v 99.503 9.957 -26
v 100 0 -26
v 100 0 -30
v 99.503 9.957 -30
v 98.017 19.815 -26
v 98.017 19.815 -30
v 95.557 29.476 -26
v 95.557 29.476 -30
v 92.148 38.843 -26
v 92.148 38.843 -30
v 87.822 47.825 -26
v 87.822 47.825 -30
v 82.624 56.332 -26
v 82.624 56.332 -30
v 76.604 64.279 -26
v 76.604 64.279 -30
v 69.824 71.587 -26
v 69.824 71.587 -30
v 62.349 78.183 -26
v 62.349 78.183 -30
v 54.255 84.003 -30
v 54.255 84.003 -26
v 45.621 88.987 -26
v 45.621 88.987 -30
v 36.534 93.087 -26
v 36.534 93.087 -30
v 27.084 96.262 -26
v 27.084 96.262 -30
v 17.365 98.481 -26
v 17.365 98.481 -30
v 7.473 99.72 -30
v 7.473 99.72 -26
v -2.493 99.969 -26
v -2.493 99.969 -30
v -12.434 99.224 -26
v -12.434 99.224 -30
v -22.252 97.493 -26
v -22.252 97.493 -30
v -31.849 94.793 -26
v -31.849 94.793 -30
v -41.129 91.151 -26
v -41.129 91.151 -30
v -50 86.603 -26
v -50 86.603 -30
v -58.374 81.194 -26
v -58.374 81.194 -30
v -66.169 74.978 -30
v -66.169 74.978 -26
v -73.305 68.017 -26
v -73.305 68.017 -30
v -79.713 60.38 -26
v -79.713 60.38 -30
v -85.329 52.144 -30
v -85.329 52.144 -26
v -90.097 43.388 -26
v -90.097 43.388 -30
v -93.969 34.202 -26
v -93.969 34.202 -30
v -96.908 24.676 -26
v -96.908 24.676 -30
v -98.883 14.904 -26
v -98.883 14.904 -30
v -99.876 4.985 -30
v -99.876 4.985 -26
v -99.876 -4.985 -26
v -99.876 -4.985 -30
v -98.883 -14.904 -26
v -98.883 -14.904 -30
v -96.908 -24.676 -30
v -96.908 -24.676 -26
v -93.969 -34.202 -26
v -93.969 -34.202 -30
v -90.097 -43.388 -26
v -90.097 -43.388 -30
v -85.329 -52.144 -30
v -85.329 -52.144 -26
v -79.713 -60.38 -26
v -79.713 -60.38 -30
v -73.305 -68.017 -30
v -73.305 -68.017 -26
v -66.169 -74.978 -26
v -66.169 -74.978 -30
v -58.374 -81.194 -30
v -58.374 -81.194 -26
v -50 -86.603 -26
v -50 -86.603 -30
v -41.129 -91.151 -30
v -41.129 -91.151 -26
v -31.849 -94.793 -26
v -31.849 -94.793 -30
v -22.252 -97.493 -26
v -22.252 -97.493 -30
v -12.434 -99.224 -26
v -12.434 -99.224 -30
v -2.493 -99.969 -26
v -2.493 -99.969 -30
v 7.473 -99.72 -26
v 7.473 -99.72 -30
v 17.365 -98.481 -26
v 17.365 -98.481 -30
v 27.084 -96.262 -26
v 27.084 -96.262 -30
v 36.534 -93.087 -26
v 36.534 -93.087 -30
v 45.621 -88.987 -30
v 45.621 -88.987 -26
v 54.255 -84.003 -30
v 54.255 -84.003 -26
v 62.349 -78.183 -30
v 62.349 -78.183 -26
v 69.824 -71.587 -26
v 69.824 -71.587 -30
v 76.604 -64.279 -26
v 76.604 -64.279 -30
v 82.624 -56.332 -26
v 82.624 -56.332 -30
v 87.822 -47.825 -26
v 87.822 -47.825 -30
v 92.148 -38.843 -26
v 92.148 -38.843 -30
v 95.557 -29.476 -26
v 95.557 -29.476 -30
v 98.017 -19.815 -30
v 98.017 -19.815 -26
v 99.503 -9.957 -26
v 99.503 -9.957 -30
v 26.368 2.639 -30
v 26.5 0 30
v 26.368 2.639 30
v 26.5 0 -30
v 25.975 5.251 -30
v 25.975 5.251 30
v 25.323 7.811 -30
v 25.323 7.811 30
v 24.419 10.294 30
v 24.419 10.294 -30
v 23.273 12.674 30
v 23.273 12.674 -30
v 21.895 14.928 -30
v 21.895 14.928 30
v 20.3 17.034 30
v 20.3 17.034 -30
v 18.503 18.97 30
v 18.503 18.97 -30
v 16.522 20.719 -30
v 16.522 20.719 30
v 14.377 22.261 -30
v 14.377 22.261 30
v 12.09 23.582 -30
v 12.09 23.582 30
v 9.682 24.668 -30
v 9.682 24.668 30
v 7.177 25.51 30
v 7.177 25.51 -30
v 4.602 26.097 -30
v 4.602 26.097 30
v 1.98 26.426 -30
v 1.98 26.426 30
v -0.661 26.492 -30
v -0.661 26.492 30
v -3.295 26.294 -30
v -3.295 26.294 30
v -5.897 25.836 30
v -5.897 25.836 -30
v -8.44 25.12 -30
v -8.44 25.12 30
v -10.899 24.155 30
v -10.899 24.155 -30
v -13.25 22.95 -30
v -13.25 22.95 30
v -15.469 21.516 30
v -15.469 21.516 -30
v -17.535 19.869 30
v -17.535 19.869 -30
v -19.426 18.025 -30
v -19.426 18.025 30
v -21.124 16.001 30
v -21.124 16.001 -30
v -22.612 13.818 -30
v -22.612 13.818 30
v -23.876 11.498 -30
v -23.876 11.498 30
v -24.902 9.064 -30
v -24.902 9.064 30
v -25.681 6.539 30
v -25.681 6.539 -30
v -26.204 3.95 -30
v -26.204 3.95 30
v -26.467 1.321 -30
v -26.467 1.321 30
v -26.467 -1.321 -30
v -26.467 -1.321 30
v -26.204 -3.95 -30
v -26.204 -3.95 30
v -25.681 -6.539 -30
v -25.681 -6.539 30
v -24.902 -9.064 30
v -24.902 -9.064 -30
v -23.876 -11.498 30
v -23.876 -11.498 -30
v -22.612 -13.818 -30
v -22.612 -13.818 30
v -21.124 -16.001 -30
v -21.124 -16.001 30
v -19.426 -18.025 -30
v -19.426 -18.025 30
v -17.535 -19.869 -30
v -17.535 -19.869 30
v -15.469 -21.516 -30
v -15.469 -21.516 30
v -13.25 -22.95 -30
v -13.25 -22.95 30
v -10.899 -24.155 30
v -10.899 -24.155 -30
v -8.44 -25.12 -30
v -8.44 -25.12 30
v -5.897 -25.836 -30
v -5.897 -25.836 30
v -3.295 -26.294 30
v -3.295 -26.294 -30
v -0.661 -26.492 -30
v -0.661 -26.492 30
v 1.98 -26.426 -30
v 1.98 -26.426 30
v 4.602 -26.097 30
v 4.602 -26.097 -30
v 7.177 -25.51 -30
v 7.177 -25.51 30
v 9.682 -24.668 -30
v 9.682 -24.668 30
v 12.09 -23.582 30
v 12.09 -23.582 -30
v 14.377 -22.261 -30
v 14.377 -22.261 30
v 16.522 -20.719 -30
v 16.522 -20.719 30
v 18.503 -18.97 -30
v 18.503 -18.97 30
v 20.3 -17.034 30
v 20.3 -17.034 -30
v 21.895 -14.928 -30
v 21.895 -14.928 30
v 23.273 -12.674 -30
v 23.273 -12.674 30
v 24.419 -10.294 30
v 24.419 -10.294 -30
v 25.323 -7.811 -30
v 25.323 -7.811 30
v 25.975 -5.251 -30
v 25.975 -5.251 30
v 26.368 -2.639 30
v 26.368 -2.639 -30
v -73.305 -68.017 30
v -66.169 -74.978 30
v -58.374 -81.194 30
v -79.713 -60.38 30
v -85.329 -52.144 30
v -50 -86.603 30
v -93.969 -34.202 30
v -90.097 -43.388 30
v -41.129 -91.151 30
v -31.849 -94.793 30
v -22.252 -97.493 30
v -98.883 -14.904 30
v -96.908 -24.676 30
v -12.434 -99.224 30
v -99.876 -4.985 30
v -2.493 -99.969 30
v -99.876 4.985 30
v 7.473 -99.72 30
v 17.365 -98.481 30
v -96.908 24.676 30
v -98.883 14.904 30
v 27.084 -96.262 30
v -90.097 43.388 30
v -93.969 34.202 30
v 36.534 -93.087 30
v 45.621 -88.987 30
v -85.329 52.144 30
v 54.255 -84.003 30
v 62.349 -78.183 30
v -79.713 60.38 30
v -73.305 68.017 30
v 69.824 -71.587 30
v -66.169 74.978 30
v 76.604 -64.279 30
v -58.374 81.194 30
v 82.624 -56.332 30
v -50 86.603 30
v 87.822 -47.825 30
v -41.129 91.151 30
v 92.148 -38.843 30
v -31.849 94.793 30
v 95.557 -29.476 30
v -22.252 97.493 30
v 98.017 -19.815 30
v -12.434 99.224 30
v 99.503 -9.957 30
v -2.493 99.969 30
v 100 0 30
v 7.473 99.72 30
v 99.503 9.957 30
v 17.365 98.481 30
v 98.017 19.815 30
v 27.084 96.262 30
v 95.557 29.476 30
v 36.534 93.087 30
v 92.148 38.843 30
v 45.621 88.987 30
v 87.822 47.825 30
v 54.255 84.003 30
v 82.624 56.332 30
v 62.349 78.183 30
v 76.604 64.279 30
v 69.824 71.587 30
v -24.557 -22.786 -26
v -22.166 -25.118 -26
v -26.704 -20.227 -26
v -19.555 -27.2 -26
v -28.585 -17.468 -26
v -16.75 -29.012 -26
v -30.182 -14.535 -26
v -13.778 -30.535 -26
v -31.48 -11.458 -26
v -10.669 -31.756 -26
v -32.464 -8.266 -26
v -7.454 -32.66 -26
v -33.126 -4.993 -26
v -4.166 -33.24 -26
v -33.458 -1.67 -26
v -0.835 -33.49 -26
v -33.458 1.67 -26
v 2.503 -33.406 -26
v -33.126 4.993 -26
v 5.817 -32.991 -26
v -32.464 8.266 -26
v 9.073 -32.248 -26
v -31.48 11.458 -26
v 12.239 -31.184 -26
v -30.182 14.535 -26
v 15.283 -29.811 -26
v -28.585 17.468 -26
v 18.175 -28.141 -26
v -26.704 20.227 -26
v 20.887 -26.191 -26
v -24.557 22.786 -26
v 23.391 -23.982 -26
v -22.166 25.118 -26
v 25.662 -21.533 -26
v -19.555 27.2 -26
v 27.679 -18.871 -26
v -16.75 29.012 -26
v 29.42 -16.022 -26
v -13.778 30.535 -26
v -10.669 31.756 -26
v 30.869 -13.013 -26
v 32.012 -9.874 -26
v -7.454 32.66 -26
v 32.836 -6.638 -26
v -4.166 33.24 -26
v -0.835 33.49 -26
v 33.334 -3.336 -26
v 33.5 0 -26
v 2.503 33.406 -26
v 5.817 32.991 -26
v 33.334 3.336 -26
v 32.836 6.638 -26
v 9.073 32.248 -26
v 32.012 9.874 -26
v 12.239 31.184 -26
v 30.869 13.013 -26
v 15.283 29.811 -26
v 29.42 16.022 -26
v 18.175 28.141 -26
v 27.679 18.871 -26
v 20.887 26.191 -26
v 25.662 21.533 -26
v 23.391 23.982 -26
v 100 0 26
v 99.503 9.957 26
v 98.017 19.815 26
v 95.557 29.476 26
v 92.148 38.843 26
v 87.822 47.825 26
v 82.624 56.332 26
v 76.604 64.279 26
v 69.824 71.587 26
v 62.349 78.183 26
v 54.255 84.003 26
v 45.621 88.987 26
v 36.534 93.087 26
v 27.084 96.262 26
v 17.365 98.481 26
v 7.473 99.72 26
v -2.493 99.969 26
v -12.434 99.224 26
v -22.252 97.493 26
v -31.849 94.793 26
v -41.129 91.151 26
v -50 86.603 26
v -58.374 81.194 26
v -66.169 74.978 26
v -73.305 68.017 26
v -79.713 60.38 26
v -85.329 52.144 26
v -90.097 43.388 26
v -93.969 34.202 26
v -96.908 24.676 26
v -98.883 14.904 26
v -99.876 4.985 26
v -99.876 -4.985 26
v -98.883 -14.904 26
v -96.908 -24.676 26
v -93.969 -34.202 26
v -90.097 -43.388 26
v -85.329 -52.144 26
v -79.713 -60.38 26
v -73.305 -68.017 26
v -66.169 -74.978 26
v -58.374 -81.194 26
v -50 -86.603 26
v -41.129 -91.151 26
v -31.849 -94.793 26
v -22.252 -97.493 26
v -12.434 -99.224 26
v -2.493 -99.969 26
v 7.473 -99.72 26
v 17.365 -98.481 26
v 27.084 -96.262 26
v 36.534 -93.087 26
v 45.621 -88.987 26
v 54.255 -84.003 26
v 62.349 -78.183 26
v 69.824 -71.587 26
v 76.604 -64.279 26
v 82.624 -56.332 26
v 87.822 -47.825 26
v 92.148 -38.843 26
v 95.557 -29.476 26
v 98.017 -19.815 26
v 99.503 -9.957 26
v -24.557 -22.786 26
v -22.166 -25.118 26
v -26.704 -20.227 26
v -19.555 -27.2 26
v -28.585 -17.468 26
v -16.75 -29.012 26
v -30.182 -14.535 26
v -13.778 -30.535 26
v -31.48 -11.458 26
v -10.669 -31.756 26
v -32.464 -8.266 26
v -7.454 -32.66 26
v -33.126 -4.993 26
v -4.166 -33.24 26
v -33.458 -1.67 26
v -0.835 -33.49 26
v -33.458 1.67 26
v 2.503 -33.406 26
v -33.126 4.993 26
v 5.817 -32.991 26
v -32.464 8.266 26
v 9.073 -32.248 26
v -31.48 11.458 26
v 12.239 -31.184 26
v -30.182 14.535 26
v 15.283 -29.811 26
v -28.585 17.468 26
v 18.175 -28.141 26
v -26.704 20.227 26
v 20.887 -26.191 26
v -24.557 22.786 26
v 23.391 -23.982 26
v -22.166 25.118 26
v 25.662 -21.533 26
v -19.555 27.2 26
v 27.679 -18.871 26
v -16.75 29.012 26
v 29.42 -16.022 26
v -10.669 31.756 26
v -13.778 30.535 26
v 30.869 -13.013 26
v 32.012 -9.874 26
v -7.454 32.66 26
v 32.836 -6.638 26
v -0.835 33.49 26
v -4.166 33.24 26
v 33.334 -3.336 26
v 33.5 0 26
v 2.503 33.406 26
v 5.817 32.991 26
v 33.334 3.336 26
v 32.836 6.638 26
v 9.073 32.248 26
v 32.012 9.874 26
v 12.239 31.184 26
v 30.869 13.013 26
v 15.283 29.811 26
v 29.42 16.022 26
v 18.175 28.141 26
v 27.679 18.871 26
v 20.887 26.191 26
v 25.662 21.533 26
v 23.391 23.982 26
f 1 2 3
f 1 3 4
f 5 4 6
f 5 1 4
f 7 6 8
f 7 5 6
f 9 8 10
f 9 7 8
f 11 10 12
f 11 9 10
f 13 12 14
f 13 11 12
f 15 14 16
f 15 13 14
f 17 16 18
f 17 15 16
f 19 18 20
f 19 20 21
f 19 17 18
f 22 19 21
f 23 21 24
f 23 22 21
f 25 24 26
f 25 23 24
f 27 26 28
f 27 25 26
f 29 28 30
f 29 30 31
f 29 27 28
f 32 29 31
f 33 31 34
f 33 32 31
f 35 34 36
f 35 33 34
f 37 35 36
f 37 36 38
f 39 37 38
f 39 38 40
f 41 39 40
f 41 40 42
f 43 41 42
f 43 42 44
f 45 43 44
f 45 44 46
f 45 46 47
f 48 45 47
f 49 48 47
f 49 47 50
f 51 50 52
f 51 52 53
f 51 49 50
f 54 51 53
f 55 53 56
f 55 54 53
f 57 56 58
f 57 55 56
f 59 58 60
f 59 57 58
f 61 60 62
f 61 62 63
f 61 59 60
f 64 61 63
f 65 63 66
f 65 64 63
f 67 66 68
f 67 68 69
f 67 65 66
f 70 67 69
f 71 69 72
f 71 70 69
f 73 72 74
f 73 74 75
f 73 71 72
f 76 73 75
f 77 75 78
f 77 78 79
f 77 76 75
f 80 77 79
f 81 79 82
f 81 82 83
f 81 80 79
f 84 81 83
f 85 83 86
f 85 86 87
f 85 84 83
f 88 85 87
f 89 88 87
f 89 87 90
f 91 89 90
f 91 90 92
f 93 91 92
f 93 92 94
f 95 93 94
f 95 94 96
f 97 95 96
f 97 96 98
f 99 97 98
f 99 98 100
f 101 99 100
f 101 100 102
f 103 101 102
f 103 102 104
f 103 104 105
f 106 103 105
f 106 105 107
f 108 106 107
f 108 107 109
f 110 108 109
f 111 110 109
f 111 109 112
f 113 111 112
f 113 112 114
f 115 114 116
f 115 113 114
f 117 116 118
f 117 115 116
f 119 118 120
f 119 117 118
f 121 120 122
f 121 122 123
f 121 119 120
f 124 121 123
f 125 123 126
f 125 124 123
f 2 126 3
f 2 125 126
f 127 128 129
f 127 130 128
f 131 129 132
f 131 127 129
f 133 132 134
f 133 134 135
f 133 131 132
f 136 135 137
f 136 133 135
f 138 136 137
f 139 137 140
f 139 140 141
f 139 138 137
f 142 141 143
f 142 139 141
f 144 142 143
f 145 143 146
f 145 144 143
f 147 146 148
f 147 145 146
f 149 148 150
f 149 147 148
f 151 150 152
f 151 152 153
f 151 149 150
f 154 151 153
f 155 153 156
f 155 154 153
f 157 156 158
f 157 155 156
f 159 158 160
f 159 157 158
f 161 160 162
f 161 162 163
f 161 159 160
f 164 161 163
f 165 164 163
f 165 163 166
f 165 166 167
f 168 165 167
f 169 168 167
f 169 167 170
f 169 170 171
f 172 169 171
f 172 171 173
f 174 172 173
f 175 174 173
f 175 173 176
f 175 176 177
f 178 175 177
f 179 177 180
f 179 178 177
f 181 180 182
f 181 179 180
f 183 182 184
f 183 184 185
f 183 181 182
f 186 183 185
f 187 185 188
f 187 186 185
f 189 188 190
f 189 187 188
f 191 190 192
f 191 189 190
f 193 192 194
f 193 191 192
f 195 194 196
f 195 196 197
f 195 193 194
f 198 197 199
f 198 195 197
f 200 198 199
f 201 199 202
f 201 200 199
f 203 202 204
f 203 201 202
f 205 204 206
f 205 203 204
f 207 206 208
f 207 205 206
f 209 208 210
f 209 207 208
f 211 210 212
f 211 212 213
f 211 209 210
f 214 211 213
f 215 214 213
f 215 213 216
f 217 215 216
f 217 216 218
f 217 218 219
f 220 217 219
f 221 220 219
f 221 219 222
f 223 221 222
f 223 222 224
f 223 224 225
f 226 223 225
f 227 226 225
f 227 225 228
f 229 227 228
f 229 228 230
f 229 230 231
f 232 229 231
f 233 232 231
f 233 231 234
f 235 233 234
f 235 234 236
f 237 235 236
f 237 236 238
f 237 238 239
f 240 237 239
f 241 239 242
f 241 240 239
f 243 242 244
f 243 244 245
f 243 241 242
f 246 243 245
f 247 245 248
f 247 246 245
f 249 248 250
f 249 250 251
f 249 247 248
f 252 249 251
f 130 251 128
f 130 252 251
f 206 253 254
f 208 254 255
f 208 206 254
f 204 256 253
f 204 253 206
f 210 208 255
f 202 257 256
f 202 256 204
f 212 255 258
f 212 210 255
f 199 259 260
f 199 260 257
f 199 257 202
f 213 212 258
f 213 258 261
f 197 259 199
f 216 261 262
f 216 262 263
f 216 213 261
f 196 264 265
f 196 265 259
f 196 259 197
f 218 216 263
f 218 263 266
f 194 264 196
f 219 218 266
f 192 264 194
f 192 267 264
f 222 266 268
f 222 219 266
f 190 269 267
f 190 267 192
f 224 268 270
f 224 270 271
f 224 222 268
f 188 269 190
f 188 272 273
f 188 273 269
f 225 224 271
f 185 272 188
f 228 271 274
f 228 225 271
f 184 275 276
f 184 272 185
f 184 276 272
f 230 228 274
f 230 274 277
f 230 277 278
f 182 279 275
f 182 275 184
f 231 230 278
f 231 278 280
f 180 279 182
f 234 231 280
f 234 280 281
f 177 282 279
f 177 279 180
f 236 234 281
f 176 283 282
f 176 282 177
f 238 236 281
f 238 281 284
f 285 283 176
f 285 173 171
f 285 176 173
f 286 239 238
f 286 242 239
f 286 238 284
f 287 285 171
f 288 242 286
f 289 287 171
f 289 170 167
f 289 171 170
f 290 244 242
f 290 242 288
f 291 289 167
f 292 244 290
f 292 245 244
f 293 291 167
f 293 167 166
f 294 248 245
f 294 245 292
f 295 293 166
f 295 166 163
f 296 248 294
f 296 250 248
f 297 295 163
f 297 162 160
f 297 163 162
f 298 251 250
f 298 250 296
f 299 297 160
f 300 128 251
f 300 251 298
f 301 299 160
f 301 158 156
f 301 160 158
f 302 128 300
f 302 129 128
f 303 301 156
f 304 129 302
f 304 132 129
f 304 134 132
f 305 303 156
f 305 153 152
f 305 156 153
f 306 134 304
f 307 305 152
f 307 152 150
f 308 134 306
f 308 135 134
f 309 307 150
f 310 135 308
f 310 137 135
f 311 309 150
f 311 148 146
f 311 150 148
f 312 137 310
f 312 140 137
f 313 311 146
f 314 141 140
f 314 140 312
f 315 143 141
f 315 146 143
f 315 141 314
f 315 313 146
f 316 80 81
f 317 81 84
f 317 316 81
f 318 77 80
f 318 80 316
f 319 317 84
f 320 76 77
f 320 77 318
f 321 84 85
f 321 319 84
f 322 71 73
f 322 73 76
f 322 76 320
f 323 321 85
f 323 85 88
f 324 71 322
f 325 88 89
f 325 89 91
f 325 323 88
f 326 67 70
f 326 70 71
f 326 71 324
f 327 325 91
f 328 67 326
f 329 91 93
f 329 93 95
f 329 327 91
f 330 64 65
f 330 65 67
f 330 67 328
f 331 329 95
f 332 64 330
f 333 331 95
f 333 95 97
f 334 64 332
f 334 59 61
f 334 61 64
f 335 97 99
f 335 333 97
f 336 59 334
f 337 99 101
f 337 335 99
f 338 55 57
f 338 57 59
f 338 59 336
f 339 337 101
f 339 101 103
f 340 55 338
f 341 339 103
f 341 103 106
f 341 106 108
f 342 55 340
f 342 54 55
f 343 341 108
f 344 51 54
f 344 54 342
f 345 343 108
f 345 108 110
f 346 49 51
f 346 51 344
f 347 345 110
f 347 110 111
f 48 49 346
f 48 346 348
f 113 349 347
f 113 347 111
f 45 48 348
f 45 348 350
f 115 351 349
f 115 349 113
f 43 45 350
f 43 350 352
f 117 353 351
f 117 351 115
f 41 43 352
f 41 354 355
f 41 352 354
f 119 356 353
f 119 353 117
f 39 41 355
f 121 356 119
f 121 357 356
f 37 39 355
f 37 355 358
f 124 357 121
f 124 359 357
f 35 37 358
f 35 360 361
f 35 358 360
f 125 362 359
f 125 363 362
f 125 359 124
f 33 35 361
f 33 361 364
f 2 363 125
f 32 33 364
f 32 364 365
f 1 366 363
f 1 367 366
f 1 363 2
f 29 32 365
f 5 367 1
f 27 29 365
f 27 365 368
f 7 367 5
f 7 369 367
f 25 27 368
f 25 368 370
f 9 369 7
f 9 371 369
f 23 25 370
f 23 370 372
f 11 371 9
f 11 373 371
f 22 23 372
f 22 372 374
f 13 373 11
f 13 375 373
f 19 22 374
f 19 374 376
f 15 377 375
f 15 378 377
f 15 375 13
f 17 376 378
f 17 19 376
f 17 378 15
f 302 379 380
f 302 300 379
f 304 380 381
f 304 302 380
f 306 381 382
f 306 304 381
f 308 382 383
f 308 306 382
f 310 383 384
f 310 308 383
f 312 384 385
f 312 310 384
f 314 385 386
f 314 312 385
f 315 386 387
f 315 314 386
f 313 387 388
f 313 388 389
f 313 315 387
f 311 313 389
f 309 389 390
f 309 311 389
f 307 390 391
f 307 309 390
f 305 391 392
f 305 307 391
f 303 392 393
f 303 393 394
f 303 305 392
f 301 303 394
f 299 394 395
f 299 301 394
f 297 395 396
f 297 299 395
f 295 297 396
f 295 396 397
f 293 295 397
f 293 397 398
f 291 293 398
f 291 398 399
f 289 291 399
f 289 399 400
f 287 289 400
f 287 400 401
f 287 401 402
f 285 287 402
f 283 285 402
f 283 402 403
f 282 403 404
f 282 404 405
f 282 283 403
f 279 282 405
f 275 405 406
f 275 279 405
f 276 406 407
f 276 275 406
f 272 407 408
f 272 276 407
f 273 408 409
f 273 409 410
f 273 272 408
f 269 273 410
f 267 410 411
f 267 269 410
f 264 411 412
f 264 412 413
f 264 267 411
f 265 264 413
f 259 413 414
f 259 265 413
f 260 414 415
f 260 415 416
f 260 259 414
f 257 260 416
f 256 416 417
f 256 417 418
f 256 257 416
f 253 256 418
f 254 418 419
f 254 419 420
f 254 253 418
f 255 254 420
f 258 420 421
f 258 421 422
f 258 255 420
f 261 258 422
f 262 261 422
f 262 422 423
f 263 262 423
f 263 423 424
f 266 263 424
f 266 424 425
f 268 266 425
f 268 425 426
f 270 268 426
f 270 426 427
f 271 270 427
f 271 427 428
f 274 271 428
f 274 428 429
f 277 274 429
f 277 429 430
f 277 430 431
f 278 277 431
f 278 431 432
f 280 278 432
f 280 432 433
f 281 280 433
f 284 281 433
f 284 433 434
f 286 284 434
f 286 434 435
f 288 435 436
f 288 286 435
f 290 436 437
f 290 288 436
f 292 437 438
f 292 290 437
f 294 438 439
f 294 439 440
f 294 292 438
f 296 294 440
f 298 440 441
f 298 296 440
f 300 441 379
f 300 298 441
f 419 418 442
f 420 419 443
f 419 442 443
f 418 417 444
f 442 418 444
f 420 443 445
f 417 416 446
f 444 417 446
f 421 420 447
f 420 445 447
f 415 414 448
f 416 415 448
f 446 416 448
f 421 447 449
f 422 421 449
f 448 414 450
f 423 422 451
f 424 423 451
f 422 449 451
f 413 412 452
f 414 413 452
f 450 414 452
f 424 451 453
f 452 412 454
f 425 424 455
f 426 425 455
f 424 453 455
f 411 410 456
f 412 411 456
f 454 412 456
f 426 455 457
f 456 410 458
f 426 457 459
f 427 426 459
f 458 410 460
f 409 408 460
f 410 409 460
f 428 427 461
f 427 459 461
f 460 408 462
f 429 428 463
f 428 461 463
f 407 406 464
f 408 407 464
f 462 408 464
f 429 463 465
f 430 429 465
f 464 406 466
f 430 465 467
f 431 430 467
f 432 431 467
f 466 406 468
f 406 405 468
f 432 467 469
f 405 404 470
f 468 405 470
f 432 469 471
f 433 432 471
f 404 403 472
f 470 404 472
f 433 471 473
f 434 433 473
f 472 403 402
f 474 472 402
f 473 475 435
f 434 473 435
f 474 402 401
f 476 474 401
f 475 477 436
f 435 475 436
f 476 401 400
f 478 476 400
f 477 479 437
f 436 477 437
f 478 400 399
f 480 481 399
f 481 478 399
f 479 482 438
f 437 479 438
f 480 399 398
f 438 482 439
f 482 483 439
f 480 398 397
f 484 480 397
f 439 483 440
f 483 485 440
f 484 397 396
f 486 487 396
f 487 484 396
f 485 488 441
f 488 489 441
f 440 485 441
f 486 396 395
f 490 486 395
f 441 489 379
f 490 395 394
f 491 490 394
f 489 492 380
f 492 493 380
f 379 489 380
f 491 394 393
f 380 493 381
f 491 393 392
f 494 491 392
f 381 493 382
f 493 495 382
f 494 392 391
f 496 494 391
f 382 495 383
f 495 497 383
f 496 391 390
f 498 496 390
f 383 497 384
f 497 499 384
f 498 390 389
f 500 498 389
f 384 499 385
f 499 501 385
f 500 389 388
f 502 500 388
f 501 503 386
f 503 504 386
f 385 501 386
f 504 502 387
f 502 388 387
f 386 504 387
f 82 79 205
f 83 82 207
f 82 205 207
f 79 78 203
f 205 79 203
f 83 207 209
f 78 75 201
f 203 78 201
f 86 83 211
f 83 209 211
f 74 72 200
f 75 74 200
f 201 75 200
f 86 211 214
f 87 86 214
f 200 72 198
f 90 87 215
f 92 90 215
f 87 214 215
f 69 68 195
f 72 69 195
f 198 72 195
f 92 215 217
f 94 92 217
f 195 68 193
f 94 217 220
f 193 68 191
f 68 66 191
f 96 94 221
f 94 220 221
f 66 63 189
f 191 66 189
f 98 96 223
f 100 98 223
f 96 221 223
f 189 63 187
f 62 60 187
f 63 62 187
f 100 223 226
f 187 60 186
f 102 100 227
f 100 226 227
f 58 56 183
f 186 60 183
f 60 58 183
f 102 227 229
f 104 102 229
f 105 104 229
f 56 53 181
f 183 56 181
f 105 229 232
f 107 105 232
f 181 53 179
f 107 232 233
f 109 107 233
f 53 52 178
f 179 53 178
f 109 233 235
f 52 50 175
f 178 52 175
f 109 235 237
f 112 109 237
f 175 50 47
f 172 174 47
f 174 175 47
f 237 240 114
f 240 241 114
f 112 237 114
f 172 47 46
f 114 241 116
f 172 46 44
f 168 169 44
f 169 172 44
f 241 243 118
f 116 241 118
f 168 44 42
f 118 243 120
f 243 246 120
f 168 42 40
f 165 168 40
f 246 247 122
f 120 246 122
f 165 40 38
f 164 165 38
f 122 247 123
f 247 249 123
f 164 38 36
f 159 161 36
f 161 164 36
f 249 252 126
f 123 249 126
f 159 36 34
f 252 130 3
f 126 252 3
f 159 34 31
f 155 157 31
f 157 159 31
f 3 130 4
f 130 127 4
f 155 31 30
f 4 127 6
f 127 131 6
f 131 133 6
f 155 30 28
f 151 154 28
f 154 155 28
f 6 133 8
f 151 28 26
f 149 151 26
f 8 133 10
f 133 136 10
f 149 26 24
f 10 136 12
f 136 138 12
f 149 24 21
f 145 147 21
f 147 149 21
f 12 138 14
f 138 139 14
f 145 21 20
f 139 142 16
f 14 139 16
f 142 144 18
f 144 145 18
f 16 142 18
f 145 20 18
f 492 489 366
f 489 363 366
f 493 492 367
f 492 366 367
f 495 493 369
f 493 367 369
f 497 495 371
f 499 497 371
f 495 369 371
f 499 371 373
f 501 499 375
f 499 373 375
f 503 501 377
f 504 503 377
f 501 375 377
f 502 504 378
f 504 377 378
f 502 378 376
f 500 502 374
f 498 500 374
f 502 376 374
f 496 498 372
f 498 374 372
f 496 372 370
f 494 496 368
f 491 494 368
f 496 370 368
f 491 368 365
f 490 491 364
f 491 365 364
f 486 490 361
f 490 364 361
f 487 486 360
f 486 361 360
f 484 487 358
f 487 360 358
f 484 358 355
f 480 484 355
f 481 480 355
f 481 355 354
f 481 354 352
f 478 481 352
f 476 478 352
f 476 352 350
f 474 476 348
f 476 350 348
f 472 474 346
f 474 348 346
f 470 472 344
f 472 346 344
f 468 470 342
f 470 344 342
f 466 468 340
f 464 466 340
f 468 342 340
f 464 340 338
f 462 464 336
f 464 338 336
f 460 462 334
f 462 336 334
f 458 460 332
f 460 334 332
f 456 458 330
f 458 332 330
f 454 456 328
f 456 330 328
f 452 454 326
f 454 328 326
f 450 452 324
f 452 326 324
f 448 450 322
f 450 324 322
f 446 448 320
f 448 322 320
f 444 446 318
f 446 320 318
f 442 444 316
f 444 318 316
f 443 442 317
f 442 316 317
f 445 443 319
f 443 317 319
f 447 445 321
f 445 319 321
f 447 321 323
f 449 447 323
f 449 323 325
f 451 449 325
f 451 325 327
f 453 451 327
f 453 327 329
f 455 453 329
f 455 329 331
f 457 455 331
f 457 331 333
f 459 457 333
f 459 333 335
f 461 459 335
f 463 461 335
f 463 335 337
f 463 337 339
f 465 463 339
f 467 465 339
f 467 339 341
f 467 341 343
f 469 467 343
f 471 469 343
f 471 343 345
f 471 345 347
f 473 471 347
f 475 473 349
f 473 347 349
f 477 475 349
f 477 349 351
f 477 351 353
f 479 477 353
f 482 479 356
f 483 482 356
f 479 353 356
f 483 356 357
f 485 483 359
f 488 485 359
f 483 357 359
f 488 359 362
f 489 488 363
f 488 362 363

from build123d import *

# Parameters (mm, degrees)
SKETCH1_R           = 100
SKETCH1_R_2         = 26.5
BOSS_EXTRUDE1_DEPTH = 30
SKETCH2_R           = 100
SKETCH2_R_2         = 33.5
CUT_EXTRUDE1_DEPTH  = 26


with BuildPart() as part:
    # Sketch1 → Boss-Extrude1 (new body, symmetric)
    with BuildSketch(Plane.XY):
        Circle(SKETCH1_R)
        Circle(SKETCH1_R_2, mode=Mode.SUBTRACT)
    extrude(amount=BOSS_EXTRUDE1_DEPTH, both=True)

    # Sketch2 → Cut-Extrude1 (cut, symmetric)
    with BuildSketch(Plane.XY):
        Circle(SKETCH2_R)
        Circle(SKETCH2_R_2, mode=Mode.SUBTRACT)
    extrude(amount=CUT_EXTRUDE1_DEPTH, both=True, mode=Mode.SUBTRACT)


solid = part.part
